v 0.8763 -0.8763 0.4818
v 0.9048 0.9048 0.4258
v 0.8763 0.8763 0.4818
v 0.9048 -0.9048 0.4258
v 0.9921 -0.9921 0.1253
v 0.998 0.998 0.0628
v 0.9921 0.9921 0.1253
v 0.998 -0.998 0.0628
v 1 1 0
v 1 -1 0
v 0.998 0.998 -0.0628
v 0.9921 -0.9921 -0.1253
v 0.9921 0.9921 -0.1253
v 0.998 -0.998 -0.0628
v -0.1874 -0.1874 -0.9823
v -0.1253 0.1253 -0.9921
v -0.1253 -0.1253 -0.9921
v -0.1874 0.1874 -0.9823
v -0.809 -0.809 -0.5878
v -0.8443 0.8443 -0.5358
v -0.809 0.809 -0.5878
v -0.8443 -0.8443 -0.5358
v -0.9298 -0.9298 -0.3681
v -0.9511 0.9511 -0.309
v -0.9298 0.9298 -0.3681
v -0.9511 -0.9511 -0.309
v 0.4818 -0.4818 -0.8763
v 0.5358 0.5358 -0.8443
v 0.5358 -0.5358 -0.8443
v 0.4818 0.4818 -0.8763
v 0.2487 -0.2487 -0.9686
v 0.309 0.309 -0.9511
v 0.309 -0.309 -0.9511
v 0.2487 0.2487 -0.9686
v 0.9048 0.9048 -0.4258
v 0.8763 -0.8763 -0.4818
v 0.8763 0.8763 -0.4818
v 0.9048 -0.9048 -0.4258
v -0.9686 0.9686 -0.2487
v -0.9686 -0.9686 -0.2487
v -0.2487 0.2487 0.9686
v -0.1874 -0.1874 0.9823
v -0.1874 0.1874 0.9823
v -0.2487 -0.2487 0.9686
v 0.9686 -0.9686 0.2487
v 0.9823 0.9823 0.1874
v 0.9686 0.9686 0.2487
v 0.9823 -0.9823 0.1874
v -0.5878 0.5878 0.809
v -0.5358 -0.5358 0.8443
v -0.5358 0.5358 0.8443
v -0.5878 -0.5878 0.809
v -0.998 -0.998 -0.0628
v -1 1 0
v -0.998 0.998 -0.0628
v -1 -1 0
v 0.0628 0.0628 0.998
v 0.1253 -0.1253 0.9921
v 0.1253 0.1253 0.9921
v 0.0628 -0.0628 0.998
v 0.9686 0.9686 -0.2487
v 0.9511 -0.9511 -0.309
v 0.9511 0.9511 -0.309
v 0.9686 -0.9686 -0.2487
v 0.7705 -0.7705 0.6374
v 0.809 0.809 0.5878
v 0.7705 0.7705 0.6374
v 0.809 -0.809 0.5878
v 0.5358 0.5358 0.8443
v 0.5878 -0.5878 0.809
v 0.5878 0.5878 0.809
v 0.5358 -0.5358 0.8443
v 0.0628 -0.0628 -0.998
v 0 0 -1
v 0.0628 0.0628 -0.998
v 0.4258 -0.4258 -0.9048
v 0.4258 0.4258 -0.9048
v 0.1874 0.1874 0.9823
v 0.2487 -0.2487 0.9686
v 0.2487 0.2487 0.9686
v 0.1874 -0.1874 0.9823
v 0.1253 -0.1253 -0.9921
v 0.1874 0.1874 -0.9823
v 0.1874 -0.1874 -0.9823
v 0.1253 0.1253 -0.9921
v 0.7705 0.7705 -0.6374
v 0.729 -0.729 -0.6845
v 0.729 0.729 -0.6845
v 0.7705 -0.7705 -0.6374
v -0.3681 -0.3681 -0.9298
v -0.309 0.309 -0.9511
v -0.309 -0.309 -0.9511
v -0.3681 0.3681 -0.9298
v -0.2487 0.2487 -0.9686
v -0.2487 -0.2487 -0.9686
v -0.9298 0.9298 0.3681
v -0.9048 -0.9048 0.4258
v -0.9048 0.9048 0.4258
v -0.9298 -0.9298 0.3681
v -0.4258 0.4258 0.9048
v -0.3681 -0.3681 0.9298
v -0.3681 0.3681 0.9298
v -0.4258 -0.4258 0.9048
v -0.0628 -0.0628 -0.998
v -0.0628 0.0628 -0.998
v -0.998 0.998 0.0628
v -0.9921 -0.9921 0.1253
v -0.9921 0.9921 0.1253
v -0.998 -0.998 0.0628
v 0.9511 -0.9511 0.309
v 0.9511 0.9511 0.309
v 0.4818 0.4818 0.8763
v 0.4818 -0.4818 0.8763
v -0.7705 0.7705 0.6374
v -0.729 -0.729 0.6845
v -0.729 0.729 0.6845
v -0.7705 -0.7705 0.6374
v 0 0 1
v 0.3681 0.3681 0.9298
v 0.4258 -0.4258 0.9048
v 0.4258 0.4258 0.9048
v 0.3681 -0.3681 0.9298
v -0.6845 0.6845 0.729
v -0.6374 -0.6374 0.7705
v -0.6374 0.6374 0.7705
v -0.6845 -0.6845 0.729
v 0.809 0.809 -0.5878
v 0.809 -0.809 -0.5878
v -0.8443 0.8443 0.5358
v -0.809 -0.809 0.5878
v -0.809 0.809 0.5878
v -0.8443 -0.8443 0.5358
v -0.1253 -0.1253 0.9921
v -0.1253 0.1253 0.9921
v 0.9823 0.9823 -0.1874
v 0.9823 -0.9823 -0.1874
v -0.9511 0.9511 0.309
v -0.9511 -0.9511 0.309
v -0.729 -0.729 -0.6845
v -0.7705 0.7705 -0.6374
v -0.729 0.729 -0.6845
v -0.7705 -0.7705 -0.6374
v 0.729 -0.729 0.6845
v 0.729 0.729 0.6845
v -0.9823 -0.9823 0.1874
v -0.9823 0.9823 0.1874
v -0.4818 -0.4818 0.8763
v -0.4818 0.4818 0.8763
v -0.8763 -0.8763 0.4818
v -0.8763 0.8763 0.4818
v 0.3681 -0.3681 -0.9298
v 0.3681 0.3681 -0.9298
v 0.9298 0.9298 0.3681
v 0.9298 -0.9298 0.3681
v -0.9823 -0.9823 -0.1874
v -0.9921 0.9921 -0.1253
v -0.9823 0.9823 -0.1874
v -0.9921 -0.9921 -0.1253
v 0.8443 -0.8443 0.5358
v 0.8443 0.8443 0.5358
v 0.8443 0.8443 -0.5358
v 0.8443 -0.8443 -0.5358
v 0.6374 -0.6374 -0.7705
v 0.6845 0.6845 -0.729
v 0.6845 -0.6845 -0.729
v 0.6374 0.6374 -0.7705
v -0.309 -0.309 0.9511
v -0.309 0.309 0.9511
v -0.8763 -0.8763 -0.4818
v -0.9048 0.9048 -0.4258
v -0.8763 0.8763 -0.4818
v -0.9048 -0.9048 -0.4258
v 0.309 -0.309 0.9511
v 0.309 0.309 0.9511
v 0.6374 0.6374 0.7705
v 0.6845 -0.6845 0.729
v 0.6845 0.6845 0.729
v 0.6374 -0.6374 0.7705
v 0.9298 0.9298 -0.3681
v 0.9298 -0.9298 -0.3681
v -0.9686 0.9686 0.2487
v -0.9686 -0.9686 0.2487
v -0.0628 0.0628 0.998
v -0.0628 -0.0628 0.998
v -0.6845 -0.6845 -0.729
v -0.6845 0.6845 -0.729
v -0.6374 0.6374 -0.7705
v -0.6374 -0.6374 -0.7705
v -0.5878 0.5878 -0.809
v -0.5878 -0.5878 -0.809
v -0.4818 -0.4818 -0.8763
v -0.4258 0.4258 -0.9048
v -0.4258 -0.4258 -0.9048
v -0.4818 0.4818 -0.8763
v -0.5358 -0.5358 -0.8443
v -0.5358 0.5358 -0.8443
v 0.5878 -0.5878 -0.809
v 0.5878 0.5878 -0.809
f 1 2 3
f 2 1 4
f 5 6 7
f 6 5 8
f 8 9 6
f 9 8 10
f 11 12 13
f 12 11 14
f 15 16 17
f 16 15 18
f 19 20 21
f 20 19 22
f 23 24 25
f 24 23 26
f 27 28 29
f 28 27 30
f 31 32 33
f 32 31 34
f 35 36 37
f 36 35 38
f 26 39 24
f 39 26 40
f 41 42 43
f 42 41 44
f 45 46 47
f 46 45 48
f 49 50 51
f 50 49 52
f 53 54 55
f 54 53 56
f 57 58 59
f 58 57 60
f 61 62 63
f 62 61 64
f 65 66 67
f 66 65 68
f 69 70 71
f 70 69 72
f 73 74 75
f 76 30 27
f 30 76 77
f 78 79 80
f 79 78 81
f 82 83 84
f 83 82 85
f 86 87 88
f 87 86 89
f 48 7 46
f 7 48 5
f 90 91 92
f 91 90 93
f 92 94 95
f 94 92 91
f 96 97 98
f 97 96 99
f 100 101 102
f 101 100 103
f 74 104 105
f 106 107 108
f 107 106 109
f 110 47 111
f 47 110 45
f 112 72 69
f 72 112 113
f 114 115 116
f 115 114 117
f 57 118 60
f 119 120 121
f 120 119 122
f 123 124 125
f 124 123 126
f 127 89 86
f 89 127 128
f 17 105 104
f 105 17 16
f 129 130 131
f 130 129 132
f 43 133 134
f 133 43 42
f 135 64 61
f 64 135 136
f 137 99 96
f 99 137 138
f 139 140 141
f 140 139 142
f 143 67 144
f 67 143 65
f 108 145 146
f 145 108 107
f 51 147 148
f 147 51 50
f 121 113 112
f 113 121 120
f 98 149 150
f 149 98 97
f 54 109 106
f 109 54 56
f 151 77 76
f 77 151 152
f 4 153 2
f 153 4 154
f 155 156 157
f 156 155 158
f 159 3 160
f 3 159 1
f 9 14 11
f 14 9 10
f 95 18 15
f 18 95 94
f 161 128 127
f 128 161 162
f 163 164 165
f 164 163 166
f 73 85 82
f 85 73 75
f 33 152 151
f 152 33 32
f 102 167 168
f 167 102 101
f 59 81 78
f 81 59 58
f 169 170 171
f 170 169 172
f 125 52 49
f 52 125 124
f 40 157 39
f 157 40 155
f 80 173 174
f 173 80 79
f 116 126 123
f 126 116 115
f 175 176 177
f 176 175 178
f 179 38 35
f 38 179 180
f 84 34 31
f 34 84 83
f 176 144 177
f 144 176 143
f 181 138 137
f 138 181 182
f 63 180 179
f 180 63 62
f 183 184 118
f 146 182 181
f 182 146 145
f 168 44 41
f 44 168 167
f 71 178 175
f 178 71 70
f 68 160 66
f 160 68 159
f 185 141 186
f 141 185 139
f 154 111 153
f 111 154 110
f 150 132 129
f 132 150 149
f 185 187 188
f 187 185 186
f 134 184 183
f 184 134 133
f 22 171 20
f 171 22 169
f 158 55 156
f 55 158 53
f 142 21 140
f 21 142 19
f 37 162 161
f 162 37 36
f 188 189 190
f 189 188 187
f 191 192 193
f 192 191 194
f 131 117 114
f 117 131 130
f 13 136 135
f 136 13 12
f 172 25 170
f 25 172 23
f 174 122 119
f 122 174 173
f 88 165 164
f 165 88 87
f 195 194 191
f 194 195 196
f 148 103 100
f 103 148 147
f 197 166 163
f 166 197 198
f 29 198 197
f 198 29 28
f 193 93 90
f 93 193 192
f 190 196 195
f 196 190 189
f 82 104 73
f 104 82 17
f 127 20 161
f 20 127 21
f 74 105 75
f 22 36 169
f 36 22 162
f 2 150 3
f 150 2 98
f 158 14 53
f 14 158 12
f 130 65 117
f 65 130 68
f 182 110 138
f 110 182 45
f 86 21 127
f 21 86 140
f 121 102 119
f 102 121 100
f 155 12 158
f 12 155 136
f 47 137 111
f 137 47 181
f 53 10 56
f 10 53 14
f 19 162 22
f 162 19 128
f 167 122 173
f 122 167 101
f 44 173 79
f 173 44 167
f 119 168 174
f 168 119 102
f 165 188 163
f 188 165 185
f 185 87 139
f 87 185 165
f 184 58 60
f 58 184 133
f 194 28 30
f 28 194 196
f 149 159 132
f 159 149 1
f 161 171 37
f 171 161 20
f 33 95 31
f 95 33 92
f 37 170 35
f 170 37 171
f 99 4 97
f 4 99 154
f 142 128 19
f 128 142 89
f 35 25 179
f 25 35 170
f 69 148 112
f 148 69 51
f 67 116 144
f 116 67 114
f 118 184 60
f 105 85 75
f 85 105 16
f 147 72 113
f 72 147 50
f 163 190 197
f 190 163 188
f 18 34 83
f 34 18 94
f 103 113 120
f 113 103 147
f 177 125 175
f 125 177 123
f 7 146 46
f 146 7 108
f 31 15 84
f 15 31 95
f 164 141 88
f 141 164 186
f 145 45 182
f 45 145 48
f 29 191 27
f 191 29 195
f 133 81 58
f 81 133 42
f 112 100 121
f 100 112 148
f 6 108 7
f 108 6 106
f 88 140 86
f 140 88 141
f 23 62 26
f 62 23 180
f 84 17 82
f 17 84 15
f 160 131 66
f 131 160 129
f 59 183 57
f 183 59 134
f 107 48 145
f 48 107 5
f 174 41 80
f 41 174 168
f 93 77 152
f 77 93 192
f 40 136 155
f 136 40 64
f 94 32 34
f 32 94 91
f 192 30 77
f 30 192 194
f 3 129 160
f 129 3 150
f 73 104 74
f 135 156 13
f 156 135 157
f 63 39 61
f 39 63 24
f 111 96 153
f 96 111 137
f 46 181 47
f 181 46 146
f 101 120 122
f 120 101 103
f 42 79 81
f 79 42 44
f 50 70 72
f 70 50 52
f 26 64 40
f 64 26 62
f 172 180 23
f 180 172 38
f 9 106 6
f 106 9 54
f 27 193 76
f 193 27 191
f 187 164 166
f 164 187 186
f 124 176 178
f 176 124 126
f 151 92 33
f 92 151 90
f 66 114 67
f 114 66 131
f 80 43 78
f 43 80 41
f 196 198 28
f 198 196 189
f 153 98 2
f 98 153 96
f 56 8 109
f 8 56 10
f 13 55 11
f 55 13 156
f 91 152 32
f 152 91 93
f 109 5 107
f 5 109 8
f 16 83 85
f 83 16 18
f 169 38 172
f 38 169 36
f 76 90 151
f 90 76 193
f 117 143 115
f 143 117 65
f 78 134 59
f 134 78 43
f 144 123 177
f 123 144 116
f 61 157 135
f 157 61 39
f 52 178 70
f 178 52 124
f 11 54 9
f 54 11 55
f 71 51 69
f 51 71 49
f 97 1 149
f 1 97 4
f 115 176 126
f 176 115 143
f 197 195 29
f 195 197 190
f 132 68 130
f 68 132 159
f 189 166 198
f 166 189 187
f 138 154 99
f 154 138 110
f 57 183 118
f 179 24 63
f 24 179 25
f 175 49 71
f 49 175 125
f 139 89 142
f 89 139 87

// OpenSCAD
intersection_for(n = [0:1]) {
    x=[for(i=[0:2]) (i==n ? 1 : 0)];
    rotate(a=90,v=x) cylinder(h=4,r=1,center=true,$fn=100);
}
